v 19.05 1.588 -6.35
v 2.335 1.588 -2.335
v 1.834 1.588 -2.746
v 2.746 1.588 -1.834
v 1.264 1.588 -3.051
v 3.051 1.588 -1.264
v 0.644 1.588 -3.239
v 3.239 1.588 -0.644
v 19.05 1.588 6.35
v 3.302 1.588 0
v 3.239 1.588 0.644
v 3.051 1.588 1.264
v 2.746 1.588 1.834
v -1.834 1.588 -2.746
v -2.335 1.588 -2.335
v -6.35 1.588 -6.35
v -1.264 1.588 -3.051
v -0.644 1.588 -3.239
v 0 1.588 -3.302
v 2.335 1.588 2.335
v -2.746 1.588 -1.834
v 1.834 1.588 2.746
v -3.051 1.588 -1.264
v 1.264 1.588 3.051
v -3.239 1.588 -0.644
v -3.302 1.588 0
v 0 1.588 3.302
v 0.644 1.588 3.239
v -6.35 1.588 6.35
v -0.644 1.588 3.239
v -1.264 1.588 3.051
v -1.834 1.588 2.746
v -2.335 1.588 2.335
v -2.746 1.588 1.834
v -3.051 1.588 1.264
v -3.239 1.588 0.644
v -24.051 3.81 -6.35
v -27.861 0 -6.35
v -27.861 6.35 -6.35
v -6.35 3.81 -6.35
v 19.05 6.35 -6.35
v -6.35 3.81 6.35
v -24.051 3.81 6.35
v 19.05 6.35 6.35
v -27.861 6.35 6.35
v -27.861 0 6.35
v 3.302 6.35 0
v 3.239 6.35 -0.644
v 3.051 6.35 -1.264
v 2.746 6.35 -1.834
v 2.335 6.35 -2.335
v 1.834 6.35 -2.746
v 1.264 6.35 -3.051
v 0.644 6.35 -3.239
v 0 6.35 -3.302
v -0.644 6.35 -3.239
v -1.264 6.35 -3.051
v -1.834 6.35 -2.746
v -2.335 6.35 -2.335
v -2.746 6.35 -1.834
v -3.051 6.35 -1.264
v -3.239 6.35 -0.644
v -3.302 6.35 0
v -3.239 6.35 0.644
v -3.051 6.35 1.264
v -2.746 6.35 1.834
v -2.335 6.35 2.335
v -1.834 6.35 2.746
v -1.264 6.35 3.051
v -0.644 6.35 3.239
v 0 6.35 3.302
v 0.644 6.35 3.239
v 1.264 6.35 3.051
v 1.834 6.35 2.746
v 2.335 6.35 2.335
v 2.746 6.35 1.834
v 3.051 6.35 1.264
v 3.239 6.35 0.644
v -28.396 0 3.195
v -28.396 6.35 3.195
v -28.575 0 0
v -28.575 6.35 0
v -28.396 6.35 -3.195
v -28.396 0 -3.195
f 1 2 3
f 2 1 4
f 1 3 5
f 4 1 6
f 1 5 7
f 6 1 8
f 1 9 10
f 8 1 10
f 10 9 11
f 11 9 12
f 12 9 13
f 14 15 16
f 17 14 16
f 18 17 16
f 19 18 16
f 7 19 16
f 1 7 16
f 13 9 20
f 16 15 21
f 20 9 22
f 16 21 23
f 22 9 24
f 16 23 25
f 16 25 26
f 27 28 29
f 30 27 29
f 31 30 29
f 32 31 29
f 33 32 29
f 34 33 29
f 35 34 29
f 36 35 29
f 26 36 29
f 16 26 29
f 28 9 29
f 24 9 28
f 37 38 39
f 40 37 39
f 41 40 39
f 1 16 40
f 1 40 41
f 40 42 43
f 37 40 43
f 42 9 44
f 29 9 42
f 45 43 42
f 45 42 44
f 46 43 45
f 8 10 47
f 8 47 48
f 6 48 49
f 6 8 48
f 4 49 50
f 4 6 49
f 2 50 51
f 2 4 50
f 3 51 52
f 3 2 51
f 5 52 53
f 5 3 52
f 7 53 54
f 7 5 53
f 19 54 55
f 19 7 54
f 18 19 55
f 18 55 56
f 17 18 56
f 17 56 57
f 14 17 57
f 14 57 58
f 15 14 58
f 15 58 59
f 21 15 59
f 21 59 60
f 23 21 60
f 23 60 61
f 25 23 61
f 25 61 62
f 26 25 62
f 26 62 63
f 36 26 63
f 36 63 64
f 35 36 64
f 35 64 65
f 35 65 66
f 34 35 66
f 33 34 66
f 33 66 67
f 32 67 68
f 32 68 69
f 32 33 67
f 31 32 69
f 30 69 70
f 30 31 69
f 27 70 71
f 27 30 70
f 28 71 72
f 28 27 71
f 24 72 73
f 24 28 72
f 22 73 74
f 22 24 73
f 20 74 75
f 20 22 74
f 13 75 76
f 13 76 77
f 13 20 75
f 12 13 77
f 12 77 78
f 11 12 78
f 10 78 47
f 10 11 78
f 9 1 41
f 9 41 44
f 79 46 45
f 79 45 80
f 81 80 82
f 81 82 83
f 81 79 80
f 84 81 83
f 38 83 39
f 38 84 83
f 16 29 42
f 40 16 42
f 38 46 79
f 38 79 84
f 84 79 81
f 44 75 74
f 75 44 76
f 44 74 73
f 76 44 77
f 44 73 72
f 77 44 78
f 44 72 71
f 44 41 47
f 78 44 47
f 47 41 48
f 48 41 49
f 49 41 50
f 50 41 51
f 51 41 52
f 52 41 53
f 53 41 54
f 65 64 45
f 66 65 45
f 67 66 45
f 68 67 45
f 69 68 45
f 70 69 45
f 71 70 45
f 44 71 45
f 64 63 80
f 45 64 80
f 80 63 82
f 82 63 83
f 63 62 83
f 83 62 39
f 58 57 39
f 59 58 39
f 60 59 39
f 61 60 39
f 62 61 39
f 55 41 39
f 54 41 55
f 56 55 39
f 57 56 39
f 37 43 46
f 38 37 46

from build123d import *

# Parameters (mm, degrees)
SKETCH1_R           = 3.302
BOSS_EXTRUDE1_DEPTH = 6.35
CUT_EXTRUDE1_DEPTH  = 13.7


with BuildPart() as part:
    # Sketch1 → Boss-Extrude1 (new body)
    with BuildSketch(Plane(origin=(0, 0, 0), x_dir=(1, 0, 0), z_dir=(0, 1, 0))):
        with BuildLine():
            Line((19.05, 6.35), (19.05, -6.35))
            Line((19.05, -6.35), (-27.86051193, -6.35))
            ThreePointArc((-27.86051193, -6.35), (-28.575, 0), (-27.86051193, 6.35))
            Line((-27.86051193, 6.35), (19.05, 6.35))
        make_face()
        Circle(SKETCH1_R, mode=Mode.SUBTRACT)
    extrude(amount=BOSS_EXTRUDE1_DEPTH)

    # Sketch2 → Cut-Extrude1 (cut, through all)
    with BuildSketch(Plane.XY.offset(6.35)):
        Polygon((19.05, 0), (19.05, 1.5875), (-6.35, 1.5875), (-26.27301193, 1.5875), (-27.86051193, 0), align=None)
        Polygon((-26.27301193, 1.5875), (-6.35, 1.5875), (-6.35, 3.81), (-24.05051193, 3.81), align=None)
    extrude(amount=-CUT_EXTRUDE1_DEPTH, mode=Mode.SUBTRACT)


solid = part.part
